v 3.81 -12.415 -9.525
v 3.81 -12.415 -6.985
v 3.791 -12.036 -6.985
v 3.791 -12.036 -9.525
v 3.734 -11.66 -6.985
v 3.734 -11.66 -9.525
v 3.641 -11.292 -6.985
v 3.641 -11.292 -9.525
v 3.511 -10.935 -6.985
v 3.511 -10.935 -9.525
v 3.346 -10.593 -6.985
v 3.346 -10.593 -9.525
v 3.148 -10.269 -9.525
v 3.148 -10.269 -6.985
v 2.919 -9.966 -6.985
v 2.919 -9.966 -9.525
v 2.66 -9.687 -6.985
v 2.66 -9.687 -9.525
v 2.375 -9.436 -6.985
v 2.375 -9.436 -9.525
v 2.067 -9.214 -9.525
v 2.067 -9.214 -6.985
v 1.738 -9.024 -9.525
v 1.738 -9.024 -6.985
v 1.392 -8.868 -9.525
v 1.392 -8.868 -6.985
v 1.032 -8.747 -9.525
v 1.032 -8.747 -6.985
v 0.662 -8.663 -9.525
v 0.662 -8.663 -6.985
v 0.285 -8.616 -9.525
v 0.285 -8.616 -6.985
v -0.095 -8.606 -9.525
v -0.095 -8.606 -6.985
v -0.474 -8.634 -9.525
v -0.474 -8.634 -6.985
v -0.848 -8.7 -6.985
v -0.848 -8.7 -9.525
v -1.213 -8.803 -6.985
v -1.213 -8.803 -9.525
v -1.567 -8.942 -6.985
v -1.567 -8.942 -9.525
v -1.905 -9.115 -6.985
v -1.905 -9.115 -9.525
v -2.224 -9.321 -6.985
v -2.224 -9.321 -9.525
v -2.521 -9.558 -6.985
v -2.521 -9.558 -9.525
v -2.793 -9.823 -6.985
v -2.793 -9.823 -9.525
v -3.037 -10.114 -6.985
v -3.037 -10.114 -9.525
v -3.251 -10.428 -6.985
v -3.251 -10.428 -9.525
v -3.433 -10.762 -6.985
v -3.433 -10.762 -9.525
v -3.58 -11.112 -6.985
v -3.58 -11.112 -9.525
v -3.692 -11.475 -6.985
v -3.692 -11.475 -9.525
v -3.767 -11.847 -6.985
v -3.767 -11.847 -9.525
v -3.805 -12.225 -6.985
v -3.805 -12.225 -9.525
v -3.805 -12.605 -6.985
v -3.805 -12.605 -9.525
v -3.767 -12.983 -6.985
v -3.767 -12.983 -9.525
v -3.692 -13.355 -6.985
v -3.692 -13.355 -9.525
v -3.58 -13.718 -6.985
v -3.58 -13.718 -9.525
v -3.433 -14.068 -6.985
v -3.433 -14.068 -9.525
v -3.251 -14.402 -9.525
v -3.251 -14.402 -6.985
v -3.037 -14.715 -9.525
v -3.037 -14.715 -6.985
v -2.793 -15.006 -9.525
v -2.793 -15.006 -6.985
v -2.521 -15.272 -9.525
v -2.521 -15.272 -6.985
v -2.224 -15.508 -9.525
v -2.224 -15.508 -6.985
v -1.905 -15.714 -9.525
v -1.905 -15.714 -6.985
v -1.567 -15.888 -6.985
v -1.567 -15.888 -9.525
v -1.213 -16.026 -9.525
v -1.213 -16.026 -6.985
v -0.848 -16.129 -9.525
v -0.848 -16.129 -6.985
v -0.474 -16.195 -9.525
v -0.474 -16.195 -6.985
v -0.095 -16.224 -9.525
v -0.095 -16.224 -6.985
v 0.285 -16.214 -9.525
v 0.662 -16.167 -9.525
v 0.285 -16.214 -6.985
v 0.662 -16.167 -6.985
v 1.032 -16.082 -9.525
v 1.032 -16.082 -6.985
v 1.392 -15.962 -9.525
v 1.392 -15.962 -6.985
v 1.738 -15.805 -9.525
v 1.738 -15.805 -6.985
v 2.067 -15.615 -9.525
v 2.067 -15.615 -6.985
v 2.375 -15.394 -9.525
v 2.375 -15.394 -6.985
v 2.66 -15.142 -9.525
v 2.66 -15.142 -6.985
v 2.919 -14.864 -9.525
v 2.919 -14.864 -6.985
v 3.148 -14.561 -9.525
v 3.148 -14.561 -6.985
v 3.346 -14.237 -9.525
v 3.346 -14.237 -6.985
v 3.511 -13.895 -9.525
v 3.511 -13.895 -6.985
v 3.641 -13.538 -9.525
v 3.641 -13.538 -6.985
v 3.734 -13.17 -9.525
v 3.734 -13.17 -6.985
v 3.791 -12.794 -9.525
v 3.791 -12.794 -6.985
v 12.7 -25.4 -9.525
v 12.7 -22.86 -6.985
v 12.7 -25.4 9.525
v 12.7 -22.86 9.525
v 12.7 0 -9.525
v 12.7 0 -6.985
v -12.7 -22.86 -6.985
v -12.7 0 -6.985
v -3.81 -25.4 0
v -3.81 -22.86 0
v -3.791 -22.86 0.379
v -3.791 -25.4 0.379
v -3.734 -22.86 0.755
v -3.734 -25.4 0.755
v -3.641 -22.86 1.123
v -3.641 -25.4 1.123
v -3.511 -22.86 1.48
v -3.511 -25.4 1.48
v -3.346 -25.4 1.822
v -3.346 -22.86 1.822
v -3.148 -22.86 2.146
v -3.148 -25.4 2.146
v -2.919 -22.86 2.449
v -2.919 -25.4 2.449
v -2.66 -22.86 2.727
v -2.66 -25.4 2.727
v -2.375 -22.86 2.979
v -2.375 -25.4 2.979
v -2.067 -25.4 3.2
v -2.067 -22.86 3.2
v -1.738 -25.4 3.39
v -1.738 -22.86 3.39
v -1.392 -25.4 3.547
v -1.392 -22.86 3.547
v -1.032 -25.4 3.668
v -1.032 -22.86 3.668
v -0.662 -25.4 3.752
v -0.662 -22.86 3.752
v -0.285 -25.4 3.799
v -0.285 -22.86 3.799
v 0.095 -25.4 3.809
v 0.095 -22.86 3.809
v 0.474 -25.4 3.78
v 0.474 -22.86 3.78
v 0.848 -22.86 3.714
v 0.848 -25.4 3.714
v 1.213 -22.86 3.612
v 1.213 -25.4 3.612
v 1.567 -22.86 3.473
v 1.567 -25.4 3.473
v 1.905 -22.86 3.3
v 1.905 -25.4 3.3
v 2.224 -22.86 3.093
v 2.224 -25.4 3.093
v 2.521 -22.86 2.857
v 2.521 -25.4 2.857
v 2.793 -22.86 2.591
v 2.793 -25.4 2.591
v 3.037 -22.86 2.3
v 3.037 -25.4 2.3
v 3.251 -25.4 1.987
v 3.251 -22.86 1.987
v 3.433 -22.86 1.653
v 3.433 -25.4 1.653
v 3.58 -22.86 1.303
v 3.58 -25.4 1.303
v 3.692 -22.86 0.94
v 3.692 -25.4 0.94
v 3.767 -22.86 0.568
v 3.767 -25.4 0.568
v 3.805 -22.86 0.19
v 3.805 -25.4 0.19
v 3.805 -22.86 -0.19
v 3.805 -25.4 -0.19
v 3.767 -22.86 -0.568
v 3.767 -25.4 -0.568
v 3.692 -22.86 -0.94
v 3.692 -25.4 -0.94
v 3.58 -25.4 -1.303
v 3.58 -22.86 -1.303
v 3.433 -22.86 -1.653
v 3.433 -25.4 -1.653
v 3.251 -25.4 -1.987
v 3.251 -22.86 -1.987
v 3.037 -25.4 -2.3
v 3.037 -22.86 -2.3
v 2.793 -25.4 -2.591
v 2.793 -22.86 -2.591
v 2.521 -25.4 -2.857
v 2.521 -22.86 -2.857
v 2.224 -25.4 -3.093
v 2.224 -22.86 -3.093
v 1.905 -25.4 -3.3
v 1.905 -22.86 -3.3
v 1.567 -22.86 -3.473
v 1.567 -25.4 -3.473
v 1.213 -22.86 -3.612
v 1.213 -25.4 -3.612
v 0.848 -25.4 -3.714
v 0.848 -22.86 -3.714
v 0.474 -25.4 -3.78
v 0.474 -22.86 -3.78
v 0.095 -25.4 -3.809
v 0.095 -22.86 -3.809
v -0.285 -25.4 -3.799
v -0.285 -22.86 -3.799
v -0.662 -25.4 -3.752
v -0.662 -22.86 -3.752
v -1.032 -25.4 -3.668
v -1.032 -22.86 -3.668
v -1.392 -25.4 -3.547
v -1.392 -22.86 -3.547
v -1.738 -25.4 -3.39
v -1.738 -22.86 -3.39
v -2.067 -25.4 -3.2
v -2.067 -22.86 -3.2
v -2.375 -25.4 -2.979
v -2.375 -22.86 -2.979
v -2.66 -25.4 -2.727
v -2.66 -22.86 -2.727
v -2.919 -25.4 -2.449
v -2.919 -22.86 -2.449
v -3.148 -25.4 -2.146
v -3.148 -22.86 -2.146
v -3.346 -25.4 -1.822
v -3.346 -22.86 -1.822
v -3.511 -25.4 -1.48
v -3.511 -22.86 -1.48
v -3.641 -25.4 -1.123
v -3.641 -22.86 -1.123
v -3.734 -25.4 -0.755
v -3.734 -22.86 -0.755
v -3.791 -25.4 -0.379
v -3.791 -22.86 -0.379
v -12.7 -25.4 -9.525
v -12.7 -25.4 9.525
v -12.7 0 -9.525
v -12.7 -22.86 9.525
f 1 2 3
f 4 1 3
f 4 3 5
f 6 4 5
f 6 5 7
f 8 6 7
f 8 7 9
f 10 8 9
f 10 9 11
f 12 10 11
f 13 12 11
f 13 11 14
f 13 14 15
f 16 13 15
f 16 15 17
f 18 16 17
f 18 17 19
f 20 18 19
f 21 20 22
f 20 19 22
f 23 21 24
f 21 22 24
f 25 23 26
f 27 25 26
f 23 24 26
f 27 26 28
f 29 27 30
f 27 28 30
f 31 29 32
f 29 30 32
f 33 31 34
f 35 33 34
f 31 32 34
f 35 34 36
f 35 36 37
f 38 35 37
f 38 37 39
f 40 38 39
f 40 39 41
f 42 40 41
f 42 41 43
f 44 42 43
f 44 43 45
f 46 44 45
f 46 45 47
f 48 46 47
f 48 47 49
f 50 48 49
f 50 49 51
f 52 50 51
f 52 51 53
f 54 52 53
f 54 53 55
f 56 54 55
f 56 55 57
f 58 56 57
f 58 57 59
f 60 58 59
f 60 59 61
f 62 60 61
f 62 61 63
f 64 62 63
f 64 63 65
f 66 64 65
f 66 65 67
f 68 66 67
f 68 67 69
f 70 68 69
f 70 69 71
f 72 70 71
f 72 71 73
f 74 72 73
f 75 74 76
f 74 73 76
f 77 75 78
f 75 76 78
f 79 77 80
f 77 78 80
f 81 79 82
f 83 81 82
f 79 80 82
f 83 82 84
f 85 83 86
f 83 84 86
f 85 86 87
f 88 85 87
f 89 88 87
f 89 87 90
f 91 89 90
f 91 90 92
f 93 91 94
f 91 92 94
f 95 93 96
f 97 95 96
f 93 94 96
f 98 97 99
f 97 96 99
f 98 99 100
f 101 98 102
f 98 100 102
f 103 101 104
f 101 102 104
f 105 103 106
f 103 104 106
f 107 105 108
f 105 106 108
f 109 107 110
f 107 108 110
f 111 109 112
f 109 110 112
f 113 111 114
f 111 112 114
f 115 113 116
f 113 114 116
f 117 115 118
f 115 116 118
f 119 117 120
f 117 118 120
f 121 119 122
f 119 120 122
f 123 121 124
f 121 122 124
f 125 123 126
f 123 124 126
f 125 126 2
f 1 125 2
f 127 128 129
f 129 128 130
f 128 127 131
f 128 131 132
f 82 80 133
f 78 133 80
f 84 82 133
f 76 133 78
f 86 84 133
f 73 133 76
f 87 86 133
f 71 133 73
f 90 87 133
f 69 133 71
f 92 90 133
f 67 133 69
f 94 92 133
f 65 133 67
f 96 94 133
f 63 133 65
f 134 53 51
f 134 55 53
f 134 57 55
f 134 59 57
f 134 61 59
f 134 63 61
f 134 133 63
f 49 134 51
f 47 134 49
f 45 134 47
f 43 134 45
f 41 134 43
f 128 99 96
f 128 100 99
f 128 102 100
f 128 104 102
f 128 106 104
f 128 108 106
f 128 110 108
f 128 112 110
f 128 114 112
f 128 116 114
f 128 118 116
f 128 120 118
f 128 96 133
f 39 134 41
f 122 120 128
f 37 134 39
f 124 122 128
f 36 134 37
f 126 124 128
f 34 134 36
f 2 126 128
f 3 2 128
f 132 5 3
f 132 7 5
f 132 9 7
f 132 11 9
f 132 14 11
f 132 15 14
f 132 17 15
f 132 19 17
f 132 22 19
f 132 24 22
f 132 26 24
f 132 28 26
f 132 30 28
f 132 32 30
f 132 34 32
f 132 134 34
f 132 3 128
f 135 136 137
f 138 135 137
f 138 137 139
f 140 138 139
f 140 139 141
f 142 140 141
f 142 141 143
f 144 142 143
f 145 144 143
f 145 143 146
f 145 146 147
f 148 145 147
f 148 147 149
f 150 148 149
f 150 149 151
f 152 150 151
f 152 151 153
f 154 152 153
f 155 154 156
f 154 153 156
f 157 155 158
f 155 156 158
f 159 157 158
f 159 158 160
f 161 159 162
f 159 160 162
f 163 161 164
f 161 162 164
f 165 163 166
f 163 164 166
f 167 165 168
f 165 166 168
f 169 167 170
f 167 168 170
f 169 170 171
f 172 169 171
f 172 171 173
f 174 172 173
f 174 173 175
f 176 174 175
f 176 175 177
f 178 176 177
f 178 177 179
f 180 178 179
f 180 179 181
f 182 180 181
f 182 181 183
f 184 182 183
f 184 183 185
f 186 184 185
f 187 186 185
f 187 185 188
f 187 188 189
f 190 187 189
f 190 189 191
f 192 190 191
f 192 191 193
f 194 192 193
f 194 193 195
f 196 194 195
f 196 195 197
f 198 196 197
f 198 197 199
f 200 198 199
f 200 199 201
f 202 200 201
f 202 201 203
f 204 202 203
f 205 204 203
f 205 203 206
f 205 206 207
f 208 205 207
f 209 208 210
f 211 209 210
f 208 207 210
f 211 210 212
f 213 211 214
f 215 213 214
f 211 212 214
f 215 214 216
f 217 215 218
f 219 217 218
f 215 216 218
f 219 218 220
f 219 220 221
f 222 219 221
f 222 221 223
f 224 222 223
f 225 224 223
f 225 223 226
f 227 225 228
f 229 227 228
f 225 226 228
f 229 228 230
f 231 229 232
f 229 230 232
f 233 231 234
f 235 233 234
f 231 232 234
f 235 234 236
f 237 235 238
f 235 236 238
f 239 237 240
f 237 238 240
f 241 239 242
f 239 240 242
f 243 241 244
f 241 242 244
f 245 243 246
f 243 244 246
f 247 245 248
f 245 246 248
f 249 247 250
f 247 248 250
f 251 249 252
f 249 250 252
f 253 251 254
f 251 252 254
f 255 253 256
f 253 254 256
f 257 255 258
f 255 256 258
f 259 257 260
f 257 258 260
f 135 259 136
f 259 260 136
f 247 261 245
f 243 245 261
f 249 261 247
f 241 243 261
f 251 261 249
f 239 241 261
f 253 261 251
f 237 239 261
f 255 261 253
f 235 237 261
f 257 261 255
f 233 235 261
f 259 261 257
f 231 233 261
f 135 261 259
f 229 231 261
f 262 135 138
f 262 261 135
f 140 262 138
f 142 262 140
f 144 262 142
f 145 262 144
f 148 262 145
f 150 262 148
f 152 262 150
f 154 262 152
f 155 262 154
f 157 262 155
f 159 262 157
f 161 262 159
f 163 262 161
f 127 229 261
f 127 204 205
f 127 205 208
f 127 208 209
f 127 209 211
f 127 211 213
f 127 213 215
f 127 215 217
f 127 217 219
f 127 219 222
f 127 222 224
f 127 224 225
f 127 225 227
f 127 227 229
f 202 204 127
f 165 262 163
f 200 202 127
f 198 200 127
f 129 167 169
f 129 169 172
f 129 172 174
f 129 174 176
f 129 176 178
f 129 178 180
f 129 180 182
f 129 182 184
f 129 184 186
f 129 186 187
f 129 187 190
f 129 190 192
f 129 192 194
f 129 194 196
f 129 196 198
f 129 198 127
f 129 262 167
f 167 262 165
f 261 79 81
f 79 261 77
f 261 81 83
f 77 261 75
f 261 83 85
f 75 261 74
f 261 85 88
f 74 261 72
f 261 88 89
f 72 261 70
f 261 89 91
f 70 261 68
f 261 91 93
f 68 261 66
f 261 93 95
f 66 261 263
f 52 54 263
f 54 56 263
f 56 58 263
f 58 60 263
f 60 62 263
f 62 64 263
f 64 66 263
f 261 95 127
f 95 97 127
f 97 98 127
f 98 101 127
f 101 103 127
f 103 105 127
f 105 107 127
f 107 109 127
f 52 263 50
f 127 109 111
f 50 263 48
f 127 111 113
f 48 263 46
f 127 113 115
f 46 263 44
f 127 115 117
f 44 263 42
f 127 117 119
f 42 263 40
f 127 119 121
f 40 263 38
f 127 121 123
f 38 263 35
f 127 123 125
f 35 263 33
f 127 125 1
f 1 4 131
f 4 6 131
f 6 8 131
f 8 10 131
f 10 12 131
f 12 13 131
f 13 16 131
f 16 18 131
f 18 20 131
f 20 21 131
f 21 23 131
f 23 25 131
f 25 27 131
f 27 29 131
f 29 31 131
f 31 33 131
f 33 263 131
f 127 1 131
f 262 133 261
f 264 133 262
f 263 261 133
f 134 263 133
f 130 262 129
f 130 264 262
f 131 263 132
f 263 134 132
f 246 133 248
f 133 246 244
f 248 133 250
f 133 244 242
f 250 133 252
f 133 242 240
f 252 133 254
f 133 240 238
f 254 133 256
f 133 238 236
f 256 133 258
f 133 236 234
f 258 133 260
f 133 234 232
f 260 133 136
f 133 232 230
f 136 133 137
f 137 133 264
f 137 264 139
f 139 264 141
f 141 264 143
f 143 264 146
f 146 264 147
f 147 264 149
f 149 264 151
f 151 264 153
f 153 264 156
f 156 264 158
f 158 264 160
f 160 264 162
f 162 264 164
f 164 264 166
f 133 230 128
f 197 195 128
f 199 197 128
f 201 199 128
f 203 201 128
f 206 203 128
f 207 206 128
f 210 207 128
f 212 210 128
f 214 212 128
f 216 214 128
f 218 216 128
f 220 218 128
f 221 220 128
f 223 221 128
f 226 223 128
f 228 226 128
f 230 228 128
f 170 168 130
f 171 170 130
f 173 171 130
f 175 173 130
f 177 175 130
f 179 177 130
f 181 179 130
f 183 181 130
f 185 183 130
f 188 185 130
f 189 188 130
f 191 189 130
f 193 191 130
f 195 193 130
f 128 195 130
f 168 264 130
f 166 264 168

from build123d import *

# Parameters (mm, degrees)
F0_W     = 25.4
F0_H     = 19.05
F1_DEPTH = 25.4
F2_T     = -2.54
F3_R     = 3.81
F5_DEPTH = 25.4
F4_R     = 3.81
F6_DEPTH = 25.4


with BuildPart() as f1:
    # F0 (on Front) → F1 (new body)
    with BuildSketch(Plane.XZ):
        Rectangle(F0_W, F0_H)
    extrude(amount=F1_DEPTH)

    # F2
    f2_openings = [f1.faces().sort_by_distance(p)[0] for p in [
        (12.7, -12.7, 0),
        (0, -12.7, 9.525),
        (0, 0, 0),
        (-12.7, -12.7, 0),
    ]]
    offset(amount=F2_T, openings=f2_openings)

    # F3 (on face) → F5 (cut)
    with BuildSketch(Plane(origin=(0, -22.86, 0), x_dir=(-1, 0, 0), z_dir=(0, 1, 0))):
        Circle(F3_R)
    extrude(amount=-F5_DEPTH, mode=Mode.SUBTRACT)

    # F4 (on face) → F6 (cut)
    with BuildSketch(Plane.XY.offset(-6.985)):
        with Locations((0, -12.414872)):
            Circle(F4_R)
    extrude(amount=-F6_DEPTH, mode=Mode.SUBTRACT)


solid = f1.part
